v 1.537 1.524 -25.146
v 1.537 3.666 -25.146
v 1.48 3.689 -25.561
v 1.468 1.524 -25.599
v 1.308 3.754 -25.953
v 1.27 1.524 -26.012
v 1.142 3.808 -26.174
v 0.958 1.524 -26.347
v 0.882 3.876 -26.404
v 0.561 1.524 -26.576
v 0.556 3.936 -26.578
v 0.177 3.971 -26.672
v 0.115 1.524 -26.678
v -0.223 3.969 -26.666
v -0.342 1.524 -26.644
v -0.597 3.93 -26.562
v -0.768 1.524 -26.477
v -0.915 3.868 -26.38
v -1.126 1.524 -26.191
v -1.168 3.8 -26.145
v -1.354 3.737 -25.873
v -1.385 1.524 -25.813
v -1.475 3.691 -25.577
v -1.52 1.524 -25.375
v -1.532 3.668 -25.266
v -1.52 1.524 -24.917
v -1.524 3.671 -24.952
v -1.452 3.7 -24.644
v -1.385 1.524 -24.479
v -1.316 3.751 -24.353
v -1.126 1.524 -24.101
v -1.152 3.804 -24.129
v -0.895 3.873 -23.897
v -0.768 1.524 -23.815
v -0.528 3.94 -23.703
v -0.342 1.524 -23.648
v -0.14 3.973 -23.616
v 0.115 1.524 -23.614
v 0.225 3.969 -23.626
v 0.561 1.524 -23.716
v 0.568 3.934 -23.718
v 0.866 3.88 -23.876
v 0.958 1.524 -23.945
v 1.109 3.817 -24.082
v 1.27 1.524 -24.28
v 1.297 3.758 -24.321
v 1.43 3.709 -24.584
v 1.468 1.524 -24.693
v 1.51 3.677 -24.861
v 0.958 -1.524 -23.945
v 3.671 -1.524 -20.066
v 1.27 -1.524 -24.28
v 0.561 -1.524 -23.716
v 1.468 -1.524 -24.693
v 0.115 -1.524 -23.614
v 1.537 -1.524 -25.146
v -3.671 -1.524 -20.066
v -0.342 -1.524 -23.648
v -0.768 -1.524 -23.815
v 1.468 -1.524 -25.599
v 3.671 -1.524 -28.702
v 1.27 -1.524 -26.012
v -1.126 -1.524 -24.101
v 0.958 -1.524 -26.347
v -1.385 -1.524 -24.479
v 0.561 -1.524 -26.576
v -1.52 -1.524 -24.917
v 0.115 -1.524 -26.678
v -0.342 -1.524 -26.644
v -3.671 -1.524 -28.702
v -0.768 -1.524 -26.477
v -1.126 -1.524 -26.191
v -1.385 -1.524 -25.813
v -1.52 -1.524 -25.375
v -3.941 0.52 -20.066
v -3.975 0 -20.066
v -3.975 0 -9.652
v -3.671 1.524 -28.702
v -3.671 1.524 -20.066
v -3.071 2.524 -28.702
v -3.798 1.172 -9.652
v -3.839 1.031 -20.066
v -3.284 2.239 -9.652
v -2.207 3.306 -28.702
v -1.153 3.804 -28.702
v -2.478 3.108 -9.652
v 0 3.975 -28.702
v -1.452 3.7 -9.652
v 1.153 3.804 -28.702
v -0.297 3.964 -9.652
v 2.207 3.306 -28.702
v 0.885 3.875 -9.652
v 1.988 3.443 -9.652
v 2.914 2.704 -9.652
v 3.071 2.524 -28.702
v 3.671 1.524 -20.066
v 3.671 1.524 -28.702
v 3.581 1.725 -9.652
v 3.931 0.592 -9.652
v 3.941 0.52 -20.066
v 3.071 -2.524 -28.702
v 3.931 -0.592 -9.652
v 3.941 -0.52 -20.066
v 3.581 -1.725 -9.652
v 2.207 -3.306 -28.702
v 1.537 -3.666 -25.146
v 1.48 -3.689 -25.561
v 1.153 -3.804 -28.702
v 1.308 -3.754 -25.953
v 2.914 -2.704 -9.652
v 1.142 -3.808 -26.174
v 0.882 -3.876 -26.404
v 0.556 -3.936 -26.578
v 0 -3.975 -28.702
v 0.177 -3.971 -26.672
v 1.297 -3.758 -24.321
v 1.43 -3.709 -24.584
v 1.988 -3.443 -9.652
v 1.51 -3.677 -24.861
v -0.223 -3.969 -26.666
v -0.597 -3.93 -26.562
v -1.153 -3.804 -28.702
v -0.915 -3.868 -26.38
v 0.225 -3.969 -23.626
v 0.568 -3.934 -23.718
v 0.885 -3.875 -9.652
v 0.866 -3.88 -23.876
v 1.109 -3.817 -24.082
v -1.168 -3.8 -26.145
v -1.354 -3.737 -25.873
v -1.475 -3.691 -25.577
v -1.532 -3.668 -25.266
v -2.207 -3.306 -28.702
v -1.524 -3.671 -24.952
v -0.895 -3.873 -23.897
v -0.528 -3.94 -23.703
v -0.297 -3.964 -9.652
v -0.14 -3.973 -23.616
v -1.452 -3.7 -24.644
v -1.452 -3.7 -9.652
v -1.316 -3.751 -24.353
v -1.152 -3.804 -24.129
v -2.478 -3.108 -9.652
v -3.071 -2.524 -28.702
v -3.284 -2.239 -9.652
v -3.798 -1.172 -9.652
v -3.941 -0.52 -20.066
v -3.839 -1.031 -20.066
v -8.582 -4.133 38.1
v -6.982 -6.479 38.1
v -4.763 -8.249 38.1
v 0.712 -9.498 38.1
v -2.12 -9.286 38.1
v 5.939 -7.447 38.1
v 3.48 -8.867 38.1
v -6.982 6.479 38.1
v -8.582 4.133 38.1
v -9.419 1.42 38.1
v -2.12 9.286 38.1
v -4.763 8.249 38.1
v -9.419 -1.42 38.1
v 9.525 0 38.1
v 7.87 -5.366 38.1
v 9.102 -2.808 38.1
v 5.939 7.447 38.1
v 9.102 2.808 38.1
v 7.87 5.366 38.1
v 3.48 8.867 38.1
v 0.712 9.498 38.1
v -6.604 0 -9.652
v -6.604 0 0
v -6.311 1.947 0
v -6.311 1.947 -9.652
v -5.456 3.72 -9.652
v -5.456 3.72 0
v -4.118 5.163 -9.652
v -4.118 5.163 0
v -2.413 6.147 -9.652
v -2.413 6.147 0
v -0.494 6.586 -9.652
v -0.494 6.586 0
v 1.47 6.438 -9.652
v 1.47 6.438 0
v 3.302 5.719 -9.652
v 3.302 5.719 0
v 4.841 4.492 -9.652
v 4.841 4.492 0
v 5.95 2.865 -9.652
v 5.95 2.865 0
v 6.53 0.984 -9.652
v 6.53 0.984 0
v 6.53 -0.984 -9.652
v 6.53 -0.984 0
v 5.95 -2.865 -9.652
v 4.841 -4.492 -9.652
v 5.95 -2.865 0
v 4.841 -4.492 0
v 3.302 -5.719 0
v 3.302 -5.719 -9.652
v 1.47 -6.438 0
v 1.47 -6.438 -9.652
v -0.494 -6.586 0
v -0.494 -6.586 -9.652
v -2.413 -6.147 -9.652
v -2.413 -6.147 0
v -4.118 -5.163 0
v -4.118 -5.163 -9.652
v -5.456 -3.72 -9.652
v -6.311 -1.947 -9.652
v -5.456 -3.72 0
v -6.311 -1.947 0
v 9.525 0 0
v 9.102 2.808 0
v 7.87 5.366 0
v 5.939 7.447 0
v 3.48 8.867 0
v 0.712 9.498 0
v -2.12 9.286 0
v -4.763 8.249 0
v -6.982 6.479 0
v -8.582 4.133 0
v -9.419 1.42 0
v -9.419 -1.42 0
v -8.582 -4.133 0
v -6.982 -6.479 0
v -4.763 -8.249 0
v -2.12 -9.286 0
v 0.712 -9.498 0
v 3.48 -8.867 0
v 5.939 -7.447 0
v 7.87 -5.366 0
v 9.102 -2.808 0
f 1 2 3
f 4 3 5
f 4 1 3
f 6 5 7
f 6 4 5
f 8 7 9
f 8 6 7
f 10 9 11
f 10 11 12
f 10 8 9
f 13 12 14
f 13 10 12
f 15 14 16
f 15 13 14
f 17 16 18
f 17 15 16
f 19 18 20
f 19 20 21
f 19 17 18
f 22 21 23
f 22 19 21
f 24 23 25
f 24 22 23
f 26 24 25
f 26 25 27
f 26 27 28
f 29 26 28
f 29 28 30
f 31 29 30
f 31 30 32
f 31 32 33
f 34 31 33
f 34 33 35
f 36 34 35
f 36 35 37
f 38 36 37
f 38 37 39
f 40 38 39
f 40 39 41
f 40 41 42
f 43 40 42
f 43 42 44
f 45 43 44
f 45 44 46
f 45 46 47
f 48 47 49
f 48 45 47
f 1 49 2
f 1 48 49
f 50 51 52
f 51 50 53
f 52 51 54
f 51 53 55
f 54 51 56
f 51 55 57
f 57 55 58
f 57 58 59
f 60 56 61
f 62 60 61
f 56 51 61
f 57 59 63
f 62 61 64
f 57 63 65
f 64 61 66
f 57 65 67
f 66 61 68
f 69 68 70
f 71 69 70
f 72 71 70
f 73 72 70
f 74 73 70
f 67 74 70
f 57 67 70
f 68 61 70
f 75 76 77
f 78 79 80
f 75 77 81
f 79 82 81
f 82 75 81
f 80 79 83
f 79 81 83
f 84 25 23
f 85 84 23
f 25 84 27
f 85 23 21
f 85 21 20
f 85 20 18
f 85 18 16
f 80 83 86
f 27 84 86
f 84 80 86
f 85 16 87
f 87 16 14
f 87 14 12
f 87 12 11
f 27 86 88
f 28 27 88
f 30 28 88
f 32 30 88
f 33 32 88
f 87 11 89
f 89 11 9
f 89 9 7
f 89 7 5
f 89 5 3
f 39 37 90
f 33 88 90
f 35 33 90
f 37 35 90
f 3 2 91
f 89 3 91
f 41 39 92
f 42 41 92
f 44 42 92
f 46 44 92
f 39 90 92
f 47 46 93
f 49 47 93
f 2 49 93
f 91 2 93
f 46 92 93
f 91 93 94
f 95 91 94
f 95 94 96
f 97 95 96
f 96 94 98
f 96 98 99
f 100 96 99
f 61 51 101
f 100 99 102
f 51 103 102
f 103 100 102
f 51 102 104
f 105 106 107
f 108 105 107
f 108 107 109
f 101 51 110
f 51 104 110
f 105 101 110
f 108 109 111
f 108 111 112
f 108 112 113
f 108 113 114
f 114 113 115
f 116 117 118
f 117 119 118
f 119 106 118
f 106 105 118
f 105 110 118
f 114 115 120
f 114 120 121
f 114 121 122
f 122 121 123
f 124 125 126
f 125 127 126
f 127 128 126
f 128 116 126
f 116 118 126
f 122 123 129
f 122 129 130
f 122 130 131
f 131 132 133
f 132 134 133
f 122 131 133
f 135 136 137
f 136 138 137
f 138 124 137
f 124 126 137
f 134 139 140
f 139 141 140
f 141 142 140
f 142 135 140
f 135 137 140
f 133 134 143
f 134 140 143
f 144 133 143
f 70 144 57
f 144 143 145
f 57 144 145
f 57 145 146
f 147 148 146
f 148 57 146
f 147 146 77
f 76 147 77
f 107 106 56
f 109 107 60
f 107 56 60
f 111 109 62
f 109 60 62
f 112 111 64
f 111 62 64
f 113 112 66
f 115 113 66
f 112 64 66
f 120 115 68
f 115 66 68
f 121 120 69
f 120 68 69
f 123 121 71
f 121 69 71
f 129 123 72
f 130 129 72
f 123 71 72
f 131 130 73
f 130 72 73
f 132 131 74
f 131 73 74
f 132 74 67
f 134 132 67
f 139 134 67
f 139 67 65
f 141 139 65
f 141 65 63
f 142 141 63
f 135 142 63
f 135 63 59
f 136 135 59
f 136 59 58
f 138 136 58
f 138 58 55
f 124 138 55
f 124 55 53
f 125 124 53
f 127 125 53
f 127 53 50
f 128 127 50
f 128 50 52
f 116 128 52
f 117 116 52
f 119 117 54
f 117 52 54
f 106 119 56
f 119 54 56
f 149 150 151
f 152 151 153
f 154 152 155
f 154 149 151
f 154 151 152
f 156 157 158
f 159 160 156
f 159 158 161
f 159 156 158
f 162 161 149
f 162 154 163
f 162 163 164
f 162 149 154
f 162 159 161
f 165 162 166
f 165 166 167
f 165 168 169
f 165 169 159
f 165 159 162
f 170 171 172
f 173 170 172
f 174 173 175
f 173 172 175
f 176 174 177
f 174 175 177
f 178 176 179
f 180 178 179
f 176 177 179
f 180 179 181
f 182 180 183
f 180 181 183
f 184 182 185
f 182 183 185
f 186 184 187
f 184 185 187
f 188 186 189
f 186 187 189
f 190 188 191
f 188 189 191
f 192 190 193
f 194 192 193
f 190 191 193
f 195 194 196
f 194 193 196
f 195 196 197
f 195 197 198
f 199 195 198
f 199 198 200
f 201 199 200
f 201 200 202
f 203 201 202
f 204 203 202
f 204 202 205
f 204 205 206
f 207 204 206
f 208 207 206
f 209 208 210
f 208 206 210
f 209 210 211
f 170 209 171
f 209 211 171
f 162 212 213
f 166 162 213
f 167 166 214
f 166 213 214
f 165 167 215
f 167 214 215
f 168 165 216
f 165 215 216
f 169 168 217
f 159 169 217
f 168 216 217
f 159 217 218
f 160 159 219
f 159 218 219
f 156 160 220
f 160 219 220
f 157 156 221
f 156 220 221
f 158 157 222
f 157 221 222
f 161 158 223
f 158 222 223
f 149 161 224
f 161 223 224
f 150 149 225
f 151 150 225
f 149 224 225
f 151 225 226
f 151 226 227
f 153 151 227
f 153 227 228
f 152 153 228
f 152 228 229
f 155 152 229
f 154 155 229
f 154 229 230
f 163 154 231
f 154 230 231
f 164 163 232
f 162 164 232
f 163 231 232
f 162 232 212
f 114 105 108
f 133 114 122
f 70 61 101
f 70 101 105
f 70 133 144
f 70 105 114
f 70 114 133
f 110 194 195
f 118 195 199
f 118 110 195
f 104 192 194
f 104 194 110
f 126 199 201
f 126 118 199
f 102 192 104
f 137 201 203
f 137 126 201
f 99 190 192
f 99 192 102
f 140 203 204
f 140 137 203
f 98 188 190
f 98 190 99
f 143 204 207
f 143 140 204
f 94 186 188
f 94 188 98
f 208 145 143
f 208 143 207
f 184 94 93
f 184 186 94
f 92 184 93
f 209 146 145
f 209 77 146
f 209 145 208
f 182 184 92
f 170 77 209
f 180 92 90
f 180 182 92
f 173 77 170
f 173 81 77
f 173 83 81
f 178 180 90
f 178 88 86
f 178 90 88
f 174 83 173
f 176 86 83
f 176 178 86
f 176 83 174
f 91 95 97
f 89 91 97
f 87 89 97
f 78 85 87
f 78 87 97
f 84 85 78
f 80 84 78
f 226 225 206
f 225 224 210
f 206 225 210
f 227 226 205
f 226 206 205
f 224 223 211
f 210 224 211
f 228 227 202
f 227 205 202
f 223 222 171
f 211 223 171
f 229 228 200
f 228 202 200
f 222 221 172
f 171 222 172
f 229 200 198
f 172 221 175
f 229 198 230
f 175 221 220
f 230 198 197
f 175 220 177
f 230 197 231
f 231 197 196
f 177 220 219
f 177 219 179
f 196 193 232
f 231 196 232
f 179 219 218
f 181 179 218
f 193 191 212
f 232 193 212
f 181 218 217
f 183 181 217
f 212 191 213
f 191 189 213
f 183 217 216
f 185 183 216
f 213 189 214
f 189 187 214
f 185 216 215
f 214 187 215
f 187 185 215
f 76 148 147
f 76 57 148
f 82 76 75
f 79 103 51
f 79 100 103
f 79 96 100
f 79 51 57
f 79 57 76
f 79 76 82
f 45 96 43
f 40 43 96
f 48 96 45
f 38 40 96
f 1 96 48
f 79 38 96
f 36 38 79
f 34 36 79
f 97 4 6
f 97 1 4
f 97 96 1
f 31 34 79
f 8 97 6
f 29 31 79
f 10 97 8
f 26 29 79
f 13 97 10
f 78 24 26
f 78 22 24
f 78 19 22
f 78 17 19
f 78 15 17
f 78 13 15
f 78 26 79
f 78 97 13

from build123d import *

# Parameters (mm, degrees)
SKETCH1_R               = 9.525
EXTRUDE1_DEPTH          = 38.1
SKETCH2_R               = 6.604
EXTRUDE2_DEPTH          = 9.652
SKETCH3_R               = 3.9751
EXTRUDE3_DEPTH          = 19.05
SKETCH4_W               = 10.16
SKETCH4_H               = 3.048
CUT_EXTRUDE1_DEPTH      = 8.636
SKETCH5_R               = 1.5367
CUT_EXTRUDE2_DEPTH      = 10.525
CUT_EXTRUDE2_DEPTH_BACK = 10.525


with BuildPart() as part:
    # Sketch1 → Extrude1 (new body)
    with BuildSketch(Plane.XY):
        Circle(SKETCH1_R)
    extrude(amount=EXTRUDE1_DEPTH)

    # Sketch2 → Extrude2 (add)
    with BuildSketch(Plane(origin=(0, 0, 0), x_dir=(-1, 0, 0), z_dir=(0, 0, -1))):
        Circle(SKETCH2_R)
    extrude(amount=EXTRUDE2_DEPTH)

    # Sketch3 → Extrude3 (add)
    with BuildSketch(Plane(origin=(0, 0, -9.652), x_dir=(-1, 0, 0), z_dir=(0, 0, -1))):
        Circle(SKETCH3_R)
    extrude(amount=EXTRUDE3_DEPTH)

    # Sketch4 → Cut-Extrude1 (cut)
    with BuildSketch(Plane(origin=(0, 0, -28.702), x_dir=(-1, 0, 0), z_dir=(0, 0, -1))):
        with Locations((0.063992248, 0)):
            Rectangle(SKETCH4_W, SKETCH4_H)
    extrude(amount=-CUT_EXTRUDE1_DEPTH, mode=Mode.SUBTRACT)

    # Sketch5 → Cut-Extrude2 (cut, two sides)
    with BuildSketch(Plane(origin=(0, 0, 0), x_dir=(1, 0, 0), z_dir=(0, 1, 0))) as cut_extrude2_sk:
        with Locations((0, 25.146)):
            Circle(SKETCH5_R)
    extrude(amount=CUT_EXTRUDE2_DEPTH, mode=Mode.SUBTRACT)
    extrude(cut_extrude2_sk.sketch, amount=-CUT_EXTRUDE2_DEPTH_BACK, mode=Mode.SUBTRACT)


solid = part.part
